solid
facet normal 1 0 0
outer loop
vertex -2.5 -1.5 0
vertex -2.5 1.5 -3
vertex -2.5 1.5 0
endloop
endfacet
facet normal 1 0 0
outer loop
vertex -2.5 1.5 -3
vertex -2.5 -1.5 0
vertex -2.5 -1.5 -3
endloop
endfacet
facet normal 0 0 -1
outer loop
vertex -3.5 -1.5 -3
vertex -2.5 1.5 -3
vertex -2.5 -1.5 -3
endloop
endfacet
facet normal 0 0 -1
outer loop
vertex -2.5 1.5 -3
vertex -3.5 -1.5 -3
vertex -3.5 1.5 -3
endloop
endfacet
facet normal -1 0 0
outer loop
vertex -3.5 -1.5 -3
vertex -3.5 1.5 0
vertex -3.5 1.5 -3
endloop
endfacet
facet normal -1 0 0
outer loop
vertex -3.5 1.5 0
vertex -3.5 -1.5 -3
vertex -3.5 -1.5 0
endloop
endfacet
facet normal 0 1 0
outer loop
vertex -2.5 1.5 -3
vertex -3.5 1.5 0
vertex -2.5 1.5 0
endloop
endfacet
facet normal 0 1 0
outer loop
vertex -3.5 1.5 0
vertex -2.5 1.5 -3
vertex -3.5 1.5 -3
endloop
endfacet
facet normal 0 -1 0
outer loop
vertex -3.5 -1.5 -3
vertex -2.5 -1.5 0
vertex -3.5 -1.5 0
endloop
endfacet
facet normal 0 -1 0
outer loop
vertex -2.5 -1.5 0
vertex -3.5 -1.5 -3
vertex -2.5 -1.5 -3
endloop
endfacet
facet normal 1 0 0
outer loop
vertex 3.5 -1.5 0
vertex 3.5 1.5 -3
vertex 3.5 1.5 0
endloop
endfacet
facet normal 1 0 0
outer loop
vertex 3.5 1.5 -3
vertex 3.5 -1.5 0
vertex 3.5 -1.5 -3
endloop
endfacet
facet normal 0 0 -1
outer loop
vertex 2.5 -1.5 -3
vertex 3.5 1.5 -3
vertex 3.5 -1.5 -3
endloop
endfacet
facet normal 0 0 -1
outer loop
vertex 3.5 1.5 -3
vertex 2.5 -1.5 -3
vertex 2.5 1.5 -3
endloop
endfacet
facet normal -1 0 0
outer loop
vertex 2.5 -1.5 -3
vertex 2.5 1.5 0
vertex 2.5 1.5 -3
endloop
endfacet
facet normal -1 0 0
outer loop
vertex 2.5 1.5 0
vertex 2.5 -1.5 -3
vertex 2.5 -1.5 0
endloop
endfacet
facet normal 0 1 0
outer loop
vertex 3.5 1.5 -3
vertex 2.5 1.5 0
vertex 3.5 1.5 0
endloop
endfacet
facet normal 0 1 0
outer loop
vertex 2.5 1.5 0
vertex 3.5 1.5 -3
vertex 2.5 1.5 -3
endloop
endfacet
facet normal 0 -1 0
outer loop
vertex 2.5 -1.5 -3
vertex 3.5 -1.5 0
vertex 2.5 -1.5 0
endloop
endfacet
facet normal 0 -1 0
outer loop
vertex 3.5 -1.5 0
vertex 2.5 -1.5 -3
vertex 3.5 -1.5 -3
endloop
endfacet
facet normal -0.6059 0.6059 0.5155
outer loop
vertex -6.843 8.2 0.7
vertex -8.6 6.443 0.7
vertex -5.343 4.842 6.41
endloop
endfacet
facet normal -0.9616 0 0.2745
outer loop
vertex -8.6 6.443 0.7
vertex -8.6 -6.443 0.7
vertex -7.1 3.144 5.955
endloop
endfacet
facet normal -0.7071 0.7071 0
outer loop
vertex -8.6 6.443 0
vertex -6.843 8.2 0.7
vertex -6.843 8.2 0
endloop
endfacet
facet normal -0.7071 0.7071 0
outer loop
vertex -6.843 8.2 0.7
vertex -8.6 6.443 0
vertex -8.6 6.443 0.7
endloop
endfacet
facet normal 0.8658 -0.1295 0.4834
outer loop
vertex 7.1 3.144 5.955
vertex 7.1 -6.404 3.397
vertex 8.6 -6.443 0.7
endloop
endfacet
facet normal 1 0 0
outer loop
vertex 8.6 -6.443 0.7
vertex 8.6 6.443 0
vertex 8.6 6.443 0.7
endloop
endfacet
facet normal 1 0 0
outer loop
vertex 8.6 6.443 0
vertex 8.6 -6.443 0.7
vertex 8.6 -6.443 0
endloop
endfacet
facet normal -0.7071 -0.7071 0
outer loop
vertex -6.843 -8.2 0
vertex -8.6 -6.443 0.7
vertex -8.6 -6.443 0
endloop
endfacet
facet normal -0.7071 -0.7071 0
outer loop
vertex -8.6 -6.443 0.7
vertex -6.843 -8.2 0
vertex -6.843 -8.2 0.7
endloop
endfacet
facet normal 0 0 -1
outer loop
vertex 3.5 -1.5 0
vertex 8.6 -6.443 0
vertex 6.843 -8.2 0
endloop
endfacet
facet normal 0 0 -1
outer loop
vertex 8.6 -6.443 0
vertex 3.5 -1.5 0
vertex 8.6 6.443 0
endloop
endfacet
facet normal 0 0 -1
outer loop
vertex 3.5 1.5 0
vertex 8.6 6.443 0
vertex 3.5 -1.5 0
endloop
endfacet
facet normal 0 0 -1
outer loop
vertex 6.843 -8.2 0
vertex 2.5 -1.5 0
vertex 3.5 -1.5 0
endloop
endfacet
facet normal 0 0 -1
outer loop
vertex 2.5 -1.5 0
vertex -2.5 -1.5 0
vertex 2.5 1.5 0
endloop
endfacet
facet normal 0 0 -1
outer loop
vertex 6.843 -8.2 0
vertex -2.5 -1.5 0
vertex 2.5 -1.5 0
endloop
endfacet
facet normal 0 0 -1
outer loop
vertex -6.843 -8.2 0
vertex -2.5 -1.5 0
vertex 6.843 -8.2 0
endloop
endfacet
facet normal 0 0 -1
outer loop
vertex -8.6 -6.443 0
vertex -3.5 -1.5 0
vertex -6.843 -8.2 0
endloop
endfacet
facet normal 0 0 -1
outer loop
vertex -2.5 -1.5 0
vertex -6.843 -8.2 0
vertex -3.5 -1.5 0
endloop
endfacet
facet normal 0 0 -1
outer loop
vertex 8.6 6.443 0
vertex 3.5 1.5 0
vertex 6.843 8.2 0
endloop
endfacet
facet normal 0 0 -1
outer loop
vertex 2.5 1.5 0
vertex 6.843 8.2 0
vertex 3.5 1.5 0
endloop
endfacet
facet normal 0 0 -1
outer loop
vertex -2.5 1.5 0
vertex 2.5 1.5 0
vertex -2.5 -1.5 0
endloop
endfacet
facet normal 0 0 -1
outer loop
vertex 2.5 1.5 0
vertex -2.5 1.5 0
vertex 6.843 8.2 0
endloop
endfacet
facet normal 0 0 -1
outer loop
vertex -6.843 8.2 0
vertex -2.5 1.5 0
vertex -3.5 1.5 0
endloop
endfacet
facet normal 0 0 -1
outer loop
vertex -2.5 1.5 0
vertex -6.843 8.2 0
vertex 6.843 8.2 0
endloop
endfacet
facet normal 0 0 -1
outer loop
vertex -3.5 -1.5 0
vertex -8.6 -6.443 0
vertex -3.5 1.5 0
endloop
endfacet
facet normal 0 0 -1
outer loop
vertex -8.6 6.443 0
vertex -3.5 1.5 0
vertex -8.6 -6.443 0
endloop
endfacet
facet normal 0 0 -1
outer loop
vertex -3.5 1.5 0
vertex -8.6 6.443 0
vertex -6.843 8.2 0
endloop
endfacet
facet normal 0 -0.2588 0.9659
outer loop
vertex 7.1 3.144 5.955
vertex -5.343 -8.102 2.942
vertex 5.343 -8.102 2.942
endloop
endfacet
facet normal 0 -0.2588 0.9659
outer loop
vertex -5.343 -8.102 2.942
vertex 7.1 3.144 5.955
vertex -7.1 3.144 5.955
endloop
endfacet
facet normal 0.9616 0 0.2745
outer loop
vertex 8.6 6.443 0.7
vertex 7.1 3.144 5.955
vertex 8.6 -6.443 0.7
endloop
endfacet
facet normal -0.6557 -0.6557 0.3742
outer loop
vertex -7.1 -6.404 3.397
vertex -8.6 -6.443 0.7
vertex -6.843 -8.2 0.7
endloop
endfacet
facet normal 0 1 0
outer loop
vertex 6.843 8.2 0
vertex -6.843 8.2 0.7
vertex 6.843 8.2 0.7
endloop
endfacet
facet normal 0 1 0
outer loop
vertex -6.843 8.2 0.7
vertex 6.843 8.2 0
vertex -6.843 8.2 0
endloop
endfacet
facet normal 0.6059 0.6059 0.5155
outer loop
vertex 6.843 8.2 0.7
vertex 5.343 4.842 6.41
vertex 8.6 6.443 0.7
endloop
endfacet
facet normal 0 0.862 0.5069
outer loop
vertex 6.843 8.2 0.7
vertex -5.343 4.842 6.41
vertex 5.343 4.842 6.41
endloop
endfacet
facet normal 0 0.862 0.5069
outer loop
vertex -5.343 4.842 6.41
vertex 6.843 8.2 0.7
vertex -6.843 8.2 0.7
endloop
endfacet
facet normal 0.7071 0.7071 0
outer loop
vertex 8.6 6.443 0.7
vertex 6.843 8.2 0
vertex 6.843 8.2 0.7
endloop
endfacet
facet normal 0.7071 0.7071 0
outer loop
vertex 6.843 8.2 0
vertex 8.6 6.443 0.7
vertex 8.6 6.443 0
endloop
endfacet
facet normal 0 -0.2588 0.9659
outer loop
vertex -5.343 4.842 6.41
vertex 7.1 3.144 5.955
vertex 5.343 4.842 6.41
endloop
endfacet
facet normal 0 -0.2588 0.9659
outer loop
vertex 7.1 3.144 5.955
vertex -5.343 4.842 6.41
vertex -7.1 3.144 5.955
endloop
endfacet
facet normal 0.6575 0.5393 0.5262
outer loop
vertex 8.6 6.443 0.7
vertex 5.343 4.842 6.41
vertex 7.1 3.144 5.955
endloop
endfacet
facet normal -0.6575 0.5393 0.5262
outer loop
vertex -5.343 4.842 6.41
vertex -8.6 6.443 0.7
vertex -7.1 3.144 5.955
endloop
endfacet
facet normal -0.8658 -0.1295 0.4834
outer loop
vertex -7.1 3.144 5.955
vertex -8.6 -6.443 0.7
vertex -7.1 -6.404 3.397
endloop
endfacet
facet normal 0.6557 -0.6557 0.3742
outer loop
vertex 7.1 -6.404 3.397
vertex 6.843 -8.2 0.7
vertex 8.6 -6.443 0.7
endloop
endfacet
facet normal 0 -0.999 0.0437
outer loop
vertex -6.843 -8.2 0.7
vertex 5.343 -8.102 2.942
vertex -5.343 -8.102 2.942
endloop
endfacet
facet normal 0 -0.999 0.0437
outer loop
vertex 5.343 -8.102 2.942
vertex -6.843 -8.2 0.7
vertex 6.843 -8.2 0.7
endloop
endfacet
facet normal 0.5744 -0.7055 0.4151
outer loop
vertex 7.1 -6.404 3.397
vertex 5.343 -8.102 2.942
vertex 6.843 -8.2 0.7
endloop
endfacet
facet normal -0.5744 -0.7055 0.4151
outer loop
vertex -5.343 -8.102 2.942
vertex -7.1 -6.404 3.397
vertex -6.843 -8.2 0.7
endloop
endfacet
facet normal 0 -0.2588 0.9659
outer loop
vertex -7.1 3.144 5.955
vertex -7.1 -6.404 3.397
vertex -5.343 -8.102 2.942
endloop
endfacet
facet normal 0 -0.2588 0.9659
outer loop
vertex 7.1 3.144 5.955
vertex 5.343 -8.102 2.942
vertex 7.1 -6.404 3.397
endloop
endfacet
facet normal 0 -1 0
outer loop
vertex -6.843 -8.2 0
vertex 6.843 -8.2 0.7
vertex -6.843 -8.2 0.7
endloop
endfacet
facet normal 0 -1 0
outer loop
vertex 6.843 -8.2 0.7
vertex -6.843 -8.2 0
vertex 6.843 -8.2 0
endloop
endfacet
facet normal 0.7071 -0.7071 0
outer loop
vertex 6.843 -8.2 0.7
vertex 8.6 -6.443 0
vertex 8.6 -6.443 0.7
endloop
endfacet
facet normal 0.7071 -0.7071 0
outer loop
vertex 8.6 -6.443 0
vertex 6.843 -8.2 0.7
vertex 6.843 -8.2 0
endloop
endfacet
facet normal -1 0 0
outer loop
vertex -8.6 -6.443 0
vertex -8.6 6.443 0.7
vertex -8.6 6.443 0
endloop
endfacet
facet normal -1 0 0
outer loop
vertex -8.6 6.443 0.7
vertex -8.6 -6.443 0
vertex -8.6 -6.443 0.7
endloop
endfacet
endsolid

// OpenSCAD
$fn=100;
g=0.7;
angle=15;
t=3;
height=4+1.5*sin(angle);
x=17.2-2*t;
y=16.4-2*t;


pins();
tilt();

module tilt() {
    hull() {
      plate(0);
      translate([0,0,height])
      rotate([angle,0,0])
      plate(3);
    }
  }

module plate(s) {
    translate([-x/2+s/2,-y/2,0])
    linear_extrude(g)
    offset(delta=t, chamfer=true)
    polygon([[0,0], [x-s,0], [x-s,y-s], [0,y-s]]);
    // 17.2, 16.4
    /* square(8); */
  }

module pins(inner=false) {
    gap = inner ? g : 0.0001;
    translate([-3,0,-3]) {
      pin(gap);
      translate([6,0,0])
      pin(gap);
    }
  }

module pin(gap) {
    size = [1+gap,3+gap,3+gap];
    translate([-(1+gap)/2, -(3+gap)/2,0])
    cube(size);
  }
